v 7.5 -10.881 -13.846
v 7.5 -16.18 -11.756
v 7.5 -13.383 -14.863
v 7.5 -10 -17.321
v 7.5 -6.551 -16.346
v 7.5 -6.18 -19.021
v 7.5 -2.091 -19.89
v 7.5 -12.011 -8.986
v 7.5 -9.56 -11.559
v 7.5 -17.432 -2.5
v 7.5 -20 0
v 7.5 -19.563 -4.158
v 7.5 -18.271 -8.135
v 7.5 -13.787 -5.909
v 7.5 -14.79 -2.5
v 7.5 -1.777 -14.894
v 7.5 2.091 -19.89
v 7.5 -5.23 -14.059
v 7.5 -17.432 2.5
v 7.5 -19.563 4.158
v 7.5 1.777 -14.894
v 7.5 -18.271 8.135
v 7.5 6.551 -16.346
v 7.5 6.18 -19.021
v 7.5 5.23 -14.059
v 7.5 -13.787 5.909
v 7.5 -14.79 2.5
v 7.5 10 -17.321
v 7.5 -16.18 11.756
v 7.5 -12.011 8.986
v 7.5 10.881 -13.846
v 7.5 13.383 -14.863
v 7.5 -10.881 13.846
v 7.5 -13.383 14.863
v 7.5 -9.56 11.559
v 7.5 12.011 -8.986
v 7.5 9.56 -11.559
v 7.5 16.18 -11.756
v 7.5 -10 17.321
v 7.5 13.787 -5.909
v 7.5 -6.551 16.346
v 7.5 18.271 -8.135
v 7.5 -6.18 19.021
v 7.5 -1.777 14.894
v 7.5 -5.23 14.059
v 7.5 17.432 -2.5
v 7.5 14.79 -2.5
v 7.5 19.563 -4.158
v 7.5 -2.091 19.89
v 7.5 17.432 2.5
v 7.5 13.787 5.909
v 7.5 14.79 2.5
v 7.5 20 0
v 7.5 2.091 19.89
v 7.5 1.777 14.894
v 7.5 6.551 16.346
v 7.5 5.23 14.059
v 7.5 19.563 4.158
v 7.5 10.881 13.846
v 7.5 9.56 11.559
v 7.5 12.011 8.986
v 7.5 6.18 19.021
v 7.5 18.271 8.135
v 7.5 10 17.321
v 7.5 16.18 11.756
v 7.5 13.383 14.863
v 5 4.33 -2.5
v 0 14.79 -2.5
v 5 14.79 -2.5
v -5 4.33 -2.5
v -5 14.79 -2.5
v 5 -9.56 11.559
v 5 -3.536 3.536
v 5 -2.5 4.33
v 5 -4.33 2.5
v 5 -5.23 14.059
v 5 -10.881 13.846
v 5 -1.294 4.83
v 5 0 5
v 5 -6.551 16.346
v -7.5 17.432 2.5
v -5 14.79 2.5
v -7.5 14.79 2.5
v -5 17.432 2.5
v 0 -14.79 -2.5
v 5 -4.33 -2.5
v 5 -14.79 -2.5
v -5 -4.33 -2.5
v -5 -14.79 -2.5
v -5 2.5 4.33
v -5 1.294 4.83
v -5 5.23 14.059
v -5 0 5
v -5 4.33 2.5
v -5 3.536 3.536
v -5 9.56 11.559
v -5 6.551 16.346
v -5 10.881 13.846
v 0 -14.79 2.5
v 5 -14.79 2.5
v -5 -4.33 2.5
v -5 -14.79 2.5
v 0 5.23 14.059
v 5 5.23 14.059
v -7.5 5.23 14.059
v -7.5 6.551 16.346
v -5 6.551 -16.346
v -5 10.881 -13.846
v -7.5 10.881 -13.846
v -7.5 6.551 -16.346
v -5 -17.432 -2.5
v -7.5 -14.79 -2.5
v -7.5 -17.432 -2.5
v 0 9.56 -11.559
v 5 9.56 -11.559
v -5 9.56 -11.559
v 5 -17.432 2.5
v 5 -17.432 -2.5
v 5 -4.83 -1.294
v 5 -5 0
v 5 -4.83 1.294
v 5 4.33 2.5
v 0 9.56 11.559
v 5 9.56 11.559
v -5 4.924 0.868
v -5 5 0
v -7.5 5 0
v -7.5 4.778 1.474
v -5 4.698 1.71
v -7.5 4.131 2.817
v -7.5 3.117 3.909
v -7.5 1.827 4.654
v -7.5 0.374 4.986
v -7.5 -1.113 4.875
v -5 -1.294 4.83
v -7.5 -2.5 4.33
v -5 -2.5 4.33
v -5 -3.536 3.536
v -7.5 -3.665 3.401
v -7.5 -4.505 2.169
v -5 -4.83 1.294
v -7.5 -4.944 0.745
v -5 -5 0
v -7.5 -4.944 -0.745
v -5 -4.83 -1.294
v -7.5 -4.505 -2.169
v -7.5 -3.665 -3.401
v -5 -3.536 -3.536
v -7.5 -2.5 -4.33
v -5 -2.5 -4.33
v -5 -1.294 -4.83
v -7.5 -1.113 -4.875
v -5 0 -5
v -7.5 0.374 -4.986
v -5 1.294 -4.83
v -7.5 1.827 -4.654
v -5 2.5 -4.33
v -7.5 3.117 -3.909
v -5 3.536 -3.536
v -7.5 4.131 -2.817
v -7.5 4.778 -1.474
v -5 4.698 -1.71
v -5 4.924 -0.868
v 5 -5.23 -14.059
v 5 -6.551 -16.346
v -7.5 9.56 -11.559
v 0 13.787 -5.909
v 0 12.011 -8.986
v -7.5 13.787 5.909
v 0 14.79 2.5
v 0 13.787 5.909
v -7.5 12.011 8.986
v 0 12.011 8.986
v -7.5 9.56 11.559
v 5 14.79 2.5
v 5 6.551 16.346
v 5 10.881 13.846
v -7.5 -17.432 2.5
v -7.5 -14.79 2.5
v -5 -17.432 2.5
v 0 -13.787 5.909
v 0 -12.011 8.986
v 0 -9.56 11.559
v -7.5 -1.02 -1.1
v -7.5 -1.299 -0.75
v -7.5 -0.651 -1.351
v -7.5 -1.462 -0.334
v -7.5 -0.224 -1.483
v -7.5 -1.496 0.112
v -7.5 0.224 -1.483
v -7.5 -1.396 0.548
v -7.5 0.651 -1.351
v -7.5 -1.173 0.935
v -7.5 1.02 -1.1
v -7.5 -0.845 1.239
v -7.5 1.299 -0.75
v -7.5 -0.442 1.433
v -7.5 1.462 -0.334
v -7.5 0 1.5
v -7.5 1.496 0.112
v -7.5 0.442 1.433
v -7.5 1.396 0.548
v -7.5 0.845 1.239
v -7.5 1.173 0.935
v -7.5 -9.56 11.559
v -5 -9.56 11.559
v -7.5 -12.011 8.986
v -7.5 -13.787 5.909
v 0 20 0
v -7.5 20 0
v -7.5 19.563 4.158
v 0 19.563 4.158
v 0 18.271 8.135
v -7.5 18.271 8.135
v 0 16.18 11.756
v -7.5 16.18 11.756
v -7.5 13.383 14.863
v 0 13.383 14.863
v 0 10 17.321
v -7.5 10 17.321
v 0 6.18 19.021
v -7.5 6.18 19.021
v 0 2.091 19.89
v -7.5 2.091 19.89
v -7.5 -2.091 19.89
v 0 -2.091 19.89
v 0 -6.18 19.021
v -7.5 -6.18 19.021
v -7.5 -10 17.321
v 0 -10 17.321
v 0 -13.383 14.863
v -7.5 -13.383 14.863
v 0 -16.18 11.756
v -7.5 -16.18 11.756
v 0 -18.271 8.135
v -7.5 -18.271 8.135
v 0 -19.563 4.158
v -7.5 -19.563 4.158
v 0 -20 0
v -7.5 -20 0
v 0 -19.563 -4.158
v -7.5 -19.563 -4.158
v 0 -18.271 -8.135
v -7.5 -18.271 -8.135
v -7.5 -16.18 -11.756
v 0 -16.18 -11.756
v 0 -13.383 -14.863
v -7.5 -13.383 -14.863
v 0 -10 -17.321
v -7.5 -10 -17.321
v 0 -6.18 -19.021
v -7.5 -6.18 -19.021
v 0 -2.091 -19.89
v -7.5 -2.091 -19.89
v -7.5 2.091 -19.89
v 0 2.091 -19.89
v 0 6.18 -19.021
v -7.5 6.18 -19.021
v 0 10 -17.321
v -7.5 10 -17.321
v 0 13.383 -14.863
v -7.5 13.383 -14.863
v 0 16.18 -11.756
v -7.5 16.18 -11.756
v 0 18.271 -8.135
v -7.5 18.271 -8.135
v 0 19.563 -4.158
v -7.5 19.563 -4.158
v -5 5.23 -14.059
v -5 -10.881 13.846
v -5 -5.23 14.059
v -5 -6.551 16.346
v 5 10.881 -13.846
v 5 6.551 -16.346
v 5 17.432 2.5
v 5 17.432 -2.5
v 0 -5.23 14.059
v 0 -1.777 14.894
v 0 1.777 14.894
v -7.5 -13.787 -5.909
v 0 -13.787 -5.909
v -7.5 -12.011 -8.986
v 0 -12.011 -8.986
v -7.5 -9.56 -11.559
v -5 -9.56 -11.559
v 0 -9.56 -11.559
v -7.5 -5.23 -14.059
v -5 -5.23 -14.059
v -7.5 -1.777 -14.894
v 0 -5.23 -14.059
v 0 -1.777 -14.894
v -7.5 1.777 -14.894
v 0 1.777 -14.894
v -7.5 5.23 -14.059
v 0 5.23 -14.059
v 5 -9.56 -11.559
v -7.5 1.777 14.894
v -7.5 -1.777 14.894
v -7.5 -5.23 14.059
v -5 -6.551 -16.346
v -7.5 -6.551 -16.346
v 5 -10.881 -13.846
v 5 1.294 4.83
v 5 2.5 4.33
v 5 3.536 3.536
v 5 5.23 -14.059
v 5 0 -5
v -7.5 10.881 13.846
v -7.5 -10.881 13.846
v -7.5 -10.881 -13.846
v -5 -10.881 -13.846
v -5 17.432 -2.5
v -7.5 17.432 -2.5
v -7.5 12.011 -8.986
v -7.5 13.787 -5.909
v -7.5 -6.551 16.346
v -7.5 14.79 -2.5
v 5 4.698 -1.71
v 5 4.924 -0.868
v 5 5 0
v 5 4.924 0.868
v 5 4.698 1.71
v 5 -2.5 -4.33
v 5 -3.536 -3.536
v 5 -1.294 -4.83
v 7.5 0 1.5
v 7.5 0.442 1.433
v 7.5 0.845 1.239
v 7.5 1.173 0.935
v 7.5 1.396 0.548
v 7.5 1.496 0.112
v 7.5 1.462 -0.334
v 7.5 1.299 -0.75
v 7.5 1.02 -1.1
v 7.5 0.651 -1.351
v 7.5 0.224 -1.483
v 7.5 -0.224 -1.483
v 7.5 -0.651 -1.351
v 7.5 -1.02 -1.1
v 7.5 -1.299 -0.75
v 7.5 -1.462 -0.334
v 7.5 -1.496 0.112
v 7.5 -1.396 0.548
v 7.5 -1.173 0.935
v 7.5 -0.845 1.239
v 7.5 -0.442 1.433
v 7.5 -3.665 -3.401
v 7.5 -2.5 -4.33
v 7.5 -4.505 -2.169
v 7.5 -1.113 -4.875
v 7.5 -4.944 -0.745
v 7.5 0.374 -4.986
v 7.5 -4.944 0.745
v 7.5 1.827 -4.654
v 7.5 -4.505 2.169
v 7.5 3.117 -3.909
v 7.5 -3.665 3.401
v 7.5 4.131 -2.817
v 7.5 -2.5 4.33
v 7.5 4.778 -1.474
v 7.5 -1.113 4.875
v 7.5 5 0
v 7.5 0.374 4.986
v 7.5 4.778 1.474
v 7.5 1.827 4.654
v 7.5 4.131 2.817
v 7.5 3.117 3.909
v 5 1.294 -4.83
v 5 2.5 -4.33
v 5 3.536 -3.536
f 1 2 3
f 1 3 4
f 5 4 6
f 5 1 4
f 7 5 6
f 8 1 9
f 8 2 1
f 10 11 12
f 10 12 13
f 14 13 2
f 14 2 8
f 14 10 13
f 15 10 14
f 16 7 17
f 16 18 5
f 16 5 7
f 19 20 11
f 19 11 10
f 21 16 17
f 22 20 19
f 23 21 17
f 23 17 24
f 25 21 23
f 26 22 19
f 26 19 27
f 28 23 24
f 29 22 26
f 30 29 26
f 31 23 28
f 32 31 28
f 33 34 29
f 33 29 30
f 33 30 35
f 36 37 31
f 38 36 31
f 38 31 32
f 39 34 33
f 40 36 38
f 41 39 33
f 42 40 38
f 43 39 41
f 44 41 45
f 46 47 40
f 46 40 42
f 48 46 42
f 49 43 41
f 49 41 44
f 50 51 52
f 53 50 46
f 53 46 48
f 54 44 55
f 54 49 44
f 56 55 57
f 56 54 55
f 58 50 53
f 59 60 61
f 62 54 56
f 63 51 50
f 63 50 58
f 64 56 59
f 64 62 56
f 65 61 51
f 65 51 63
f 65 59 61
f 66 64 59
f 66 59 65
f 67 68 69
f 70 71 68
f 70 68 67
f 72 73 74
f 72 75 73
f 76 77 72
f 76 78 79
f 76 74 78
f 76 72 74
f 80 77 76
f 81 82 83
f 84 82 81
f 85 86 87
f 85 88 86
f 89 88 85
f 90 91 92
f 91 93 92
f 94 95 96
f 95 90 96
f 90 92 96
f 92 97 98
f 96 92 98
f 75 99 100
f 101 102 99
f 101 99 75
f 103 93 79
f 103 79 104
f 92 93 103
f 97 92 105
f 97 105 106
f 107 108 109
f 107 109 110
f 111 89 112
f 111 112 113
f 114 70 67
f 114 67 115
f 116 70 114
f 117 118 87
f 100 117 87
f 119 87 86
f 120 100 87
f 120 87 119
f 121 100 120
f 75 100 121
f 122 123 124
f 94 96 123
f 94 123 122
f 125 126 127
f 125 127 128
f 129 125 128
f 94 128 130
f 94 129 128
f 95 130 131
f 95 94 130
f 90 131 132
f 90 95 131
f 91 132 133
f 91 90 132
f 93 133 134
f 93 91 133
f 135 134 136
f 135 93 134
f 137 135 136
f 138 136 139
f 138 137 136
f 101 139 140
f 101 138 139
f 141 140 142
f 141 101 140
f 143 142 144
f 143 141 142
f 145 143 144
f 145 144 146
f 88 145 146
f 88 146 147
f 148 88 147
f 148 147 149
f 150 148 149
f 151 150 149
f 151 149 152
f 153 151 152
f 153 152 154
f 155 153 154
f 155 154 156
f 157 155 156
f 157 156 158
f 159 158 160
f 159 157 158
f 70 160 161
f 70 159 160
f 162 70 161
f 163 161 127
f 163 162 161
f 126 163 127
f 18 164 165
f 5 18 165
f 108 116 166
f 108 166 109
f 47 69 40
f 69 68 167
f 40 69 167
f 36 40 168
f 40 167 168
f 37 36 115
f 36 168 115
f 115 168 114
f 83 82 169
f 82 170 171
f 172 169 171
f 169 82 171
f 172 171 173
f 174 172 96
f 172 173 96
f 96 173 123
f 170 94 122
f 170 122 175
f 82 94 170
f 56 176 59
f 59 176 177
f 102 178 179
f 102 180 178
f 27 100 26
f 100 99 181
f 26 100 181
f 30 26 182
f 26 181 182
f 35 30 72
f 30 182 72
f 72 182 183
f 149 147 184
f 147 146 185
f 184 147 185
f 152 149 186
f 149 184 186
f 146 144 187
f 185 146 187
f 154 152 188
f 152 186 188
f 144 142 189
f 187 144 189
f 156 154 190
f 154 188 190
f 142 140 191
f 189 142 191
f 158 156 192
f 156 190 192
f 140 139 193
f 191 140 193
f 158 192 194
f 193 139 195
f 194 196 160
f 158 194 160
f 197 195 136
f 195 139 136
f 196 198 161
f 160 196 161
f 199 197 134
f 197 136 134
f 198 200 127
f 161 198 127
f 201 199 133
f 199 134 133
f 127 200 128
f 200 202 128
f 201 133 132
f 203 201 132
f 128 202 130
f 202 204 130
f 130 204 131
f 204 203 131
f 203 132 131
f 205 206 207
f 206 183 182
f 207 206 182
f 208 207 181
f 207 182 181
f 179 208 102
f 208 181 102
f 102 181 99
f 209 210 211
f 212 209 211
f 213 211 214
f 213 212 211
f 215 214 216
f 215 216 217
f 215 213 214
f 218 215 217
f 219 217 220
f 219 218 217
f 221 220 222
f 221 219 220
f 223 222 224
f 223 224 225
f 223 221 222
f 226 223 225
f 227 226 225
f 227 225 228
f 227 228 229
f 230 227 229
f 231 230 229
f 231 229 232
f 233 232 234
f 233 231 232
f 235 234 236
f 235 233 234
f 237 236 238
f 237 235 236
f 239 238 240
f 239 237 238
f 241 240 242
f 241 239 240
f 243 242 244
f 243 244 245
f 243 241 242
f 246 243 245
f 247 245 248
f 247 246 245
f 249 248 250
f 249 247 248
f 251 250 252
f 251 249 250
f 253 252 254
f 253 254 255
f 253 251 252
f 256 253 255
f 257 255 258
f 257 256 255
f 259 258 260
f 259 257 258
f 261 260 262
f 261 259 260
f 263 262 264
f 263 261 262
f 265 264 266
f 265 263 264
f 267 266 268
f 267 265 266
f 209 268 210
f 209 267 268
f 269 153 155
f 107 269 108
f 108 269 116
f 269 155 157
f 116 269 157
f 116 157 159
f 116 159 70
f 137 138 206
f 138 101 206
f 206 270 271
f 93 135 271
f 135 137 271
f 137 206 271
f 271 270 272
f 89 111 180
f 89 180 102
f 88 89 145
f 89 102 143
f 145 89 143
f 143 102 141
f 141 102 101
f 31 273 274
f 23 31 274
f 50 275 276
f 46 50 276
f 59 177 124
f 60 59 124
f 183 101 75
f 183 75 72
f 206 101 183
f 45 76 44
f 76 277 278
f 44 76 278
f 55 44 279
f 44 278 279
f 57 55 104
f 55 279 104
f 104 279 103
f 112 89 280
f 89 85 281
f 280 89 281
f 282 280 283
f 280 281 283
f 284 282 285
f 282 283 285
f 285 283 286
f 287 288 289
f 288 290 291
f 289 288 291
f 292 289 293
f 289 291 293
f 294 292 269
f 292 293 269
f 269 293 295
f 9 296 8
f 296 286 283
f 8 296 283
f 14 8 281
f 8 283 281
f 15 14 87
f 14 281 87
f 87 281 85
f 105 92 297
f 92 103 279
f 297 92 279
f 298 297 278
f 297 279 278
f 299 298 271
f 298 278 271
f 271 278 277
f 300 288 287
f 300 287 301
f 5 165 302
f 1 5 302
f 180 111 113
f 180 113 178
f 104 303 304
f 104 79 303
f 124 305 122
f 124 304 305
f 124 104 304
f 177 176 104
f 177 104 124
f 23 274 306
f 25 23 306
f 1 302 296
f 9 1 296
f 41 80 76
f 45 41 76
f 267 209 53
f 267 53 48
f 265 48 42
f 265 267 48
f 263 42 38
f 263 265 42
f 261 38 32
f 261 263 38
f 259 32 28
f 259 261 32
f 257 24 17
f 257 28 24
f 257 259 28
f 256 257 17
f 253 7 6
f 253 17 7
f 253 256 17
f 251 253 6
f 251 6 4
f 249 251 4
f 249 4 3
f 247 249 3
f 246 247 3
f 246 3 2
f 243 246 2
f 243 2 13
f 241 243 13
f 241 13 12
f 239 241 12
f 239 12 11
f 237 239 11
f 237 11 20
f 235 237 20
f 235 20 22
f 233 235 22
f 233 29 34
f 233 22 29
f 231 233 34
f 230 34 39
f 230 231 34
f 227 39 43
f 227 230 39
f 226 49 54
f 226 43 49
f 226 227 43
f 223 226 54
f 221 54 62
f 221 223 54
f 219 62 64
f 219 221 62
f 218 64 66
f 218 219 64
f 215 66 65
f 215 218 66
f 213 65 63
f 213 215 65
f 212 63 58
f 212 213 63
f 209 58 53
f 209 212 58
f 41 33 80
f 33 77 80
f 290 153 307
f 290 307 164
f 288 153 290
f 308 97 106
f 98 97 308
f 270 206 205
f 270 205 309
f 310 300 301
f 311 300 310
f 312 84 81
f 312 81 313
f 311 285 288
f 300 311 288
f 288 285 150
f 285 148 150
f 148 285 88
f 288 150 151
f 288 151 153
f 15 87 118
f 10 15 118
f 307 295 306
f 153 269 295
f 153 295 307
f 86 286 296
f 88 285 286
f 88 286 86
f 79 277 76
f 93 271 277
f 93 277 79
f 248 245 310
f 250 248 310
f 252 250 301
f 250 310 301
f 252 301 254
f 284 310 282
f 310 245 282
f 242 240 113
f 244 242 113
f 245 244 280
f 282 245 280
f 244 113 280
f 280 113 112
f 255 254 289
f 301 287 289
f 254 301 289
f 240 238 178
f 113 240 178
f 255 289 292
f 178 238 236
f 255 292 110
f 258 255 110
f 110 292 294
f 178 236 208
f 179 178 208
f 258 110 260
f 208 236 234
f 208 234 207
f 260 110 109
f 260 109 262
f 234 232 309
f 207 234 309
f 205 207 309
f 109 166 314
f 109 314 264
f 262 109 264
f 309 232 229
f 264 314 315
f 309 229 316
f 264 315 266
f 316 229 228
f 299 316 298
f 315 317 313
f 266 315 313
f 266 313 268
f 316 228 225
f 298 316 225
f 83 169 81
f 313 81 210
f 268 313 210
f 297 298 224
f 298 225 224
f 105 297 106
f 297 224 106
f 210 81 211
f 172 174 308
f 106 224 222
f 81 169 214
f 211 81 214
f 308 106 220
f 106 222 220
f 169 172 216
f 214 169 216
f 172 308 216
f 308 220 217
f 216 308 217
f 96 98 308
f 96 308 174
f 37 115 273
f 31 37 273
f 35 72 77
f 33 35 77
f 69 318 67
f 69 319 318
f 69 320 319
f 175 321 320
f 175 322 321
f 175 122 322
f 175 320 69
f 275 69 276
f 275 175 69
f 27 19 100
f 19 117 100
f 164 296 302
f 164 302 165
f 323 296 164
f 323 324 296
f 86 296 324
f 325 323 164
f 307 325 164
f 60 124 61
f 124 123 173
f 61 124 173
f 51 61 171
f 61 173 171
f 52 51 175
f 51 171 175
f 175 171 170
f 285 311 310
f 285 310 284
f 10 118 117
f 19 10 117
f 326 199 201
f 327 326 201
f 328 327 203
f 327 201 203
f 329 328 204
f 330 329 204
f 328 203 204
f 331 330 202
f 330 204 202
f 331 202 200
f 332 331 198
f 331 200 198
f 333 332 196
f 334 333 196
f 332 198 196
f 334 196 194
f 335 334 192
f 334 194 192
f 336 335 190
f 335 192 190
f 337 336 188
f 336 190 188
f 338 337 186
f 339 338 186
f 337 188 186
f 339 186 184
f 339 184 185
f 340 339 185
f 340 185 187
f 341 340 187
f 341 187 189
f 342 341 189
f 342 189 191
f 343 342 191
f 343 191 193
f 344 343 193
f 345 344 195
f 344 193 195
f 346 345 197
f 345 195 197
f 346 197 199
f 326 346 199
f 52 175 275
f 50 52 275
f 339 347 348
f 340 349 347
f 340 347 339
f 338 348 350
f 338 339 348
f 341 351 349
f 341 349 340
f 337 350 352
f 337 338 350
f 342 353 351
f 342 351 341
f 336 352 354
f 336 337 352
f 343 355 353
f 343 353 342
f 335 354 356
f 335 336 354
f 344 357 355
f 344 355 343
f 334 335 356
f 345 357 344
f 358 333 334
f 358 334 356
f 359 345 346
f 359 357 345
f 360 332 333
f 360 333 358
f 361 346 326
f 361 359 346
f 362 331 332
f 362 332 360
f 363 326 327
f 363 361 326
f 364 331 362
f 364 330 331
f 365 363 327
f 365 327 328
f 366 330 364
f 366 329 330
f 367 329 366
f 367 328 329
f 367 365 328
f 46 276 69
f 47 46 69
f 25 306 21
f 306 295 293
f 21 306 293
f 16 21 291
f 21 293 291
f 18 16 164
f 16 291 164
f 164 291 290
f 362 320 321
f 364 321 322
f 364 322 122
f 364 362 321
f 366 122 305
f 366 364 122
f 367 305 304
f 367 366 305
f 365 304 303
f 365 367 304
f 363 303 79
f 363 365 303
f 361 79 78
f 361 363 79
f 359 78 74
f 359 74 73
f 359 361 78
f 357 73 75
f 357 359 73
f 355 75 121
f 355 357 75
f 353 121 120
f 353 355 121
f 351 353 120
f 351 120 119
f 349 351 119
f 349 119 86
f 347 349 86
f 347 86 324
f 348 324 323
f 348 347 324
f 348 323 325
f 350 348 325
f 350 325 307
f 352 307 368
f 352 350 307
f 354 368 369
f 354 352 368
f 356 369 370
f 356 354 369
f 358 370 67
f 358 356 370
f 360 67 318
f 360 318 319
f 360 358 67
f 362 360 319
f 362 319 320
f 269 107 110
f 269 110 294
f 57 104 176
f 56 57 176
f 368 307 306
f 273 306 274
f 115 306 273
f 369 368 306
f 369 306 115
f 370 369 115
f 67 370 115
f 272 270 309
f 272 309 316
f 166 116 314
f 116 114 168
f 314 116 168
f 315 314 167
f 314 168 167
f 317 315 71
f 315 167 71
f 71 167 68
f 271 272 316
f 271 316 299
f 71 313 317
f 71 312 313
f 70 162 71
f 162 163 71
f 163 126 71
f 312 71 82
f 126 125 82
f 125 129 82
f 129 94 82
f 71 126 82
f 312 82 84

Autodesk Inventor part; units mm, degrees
ref_plane "YZ Plane" through (0, 0, 0) normal (1, 0, 0) x (0, 1, 0)
ref_plane "XZ Plane" through (0, 0, 0) normal (0, 1, 0) x (-1, 0, 0)
ref_plane "XY Plane" through (0, 0, 0) normal (0, 0, 1) x (1, 0, 0)
sketch "Sketch1" plane through (0, 0, 0) normal (1, 0, 0) x (0, 1, 0)
  circle A0 centre (0, 0) radius 20
  circle A1 centre (0, 0) radius 15
  circle A2 centre (0, 0) radius 5
  line L0 (20, 0) -> (9.9317, 0) construction
  line L1 (9.9317, 0) -> (0, 0) construction
  line L2 (17.4317, -2.5) -> (2.4317, -2.5)
  line L3 (2.4317, -2.5) -> (2.4317, 2.5)
  line L4 (2.4317, 2.5) -> (17.4317, 2.5)
  line L5 (17.4317, 2.5) -> (17.4317, -2.5)
  line L6 (17.4317, -2.5) -> (2.4317, 2.5) construction
  line L7 (2.4317, -2.5) -> (17.4317, 2.5) construction
  line L8 (-0.9492, 3.3559) -> (6.5508, 16.3463)
  line L9 (10.8809, 13.8463) -> (3.3809, 0.8559)
  line L10 (6.5508, 16.3463) -> (10.8809, 13.8463)
  line L11 (3.3809, 0.8559) -> (-0.9492, 3.3559)
  line L12 (-3.3809, 0.8559) -> (-10.8809, 13.8463)
  line L13 (-6.5508, 16.3463) -> (0.9492, 3.3559)
  line L14 (-10.8809, 13.8463) -> (-6.5508, 16.3463)
  line L15 (0.9492, 3.3559) -> (-3.3809, 0.8559)
  line L16 (-2.4317, -2.5) -> (-17.4317, -2.5)
  line L17 (-17.4317, 2.5) -> (-2.4317, 2.5)
  line L18 (-17.4317, -2.5) -> (-17.4317, 2.5)
  line L19 (-2.4317, 2.5) -> (-2.4317, -2.5)
  line L20 (0.9492, -3.3559) -> (-6.5508, -16.3463)
  line L21 (-10.8809, -13.8463) -> (-3.3809, -0.8559)
  line L22 (-6.5508, -16.3463) -> (-10.8809, -13.8463)
  line L23 (-3.3809, -0.8559) -> (0.9492, -3.3559)
  line L24 (3.3809, -0.8559) -> (10.8809, -13.8463)
  line L25 (6.5508, -16.3463) -> (-0.9492, -3.3559)
  line L26 (10.8809, -13.8463) -> (6.5508, -16.3463)
  line L27 (-0.9492, -3.3559) -> (3.3809, -0.8559)
  dimension "d0" = 40
  dimension "d1" = 30
  dimension "d2" = 10
  dimension "d4" = 15
  dimension "d5" = 5
  dimension "d8" = 360
extrude "Extrusion1" add sketch "Sketch1" along normal mid plane 15 contours A0 | L4 L3 L11 L15 L13 A2 | L9 L11 L3 L4 | A2 L24 L27 L3 L11 L9 | A2 L20 L23 L27 L3 L2 | L2 L3 L27 L24 | L8 L11 L15 L19 L17 A2 | L13 L15 L11 L8 | L25 L27 L23 L20 | A2 L16 L19 L23 L27 L25 | L12 L15 L19 L23 L21 A2 | L17 L19 L15 L12 | L3 L27 L23 L19 L15 L11 | L21 L23 L19 L16
extrude "Extrusion2" add sketch "Sketch1" along normal mid plane 10 contours A1 L2 A2 L4 | A1 L4 L5 L2 | L9 A2 L8 A1 | A1 L8 L10 L9 | L4 L3 L11 L15 L13 A2 | L9 L11 L3 L4 | A2 L24 L27 L3 L11 L9 | L24 L26 L25 A1 | A1 L25 A2 L24 | A2 L20 L23 L27 L3 L2 | L2 L3 L27 L24 | L8 L11 L15 L19 L17 A2 | L13 L15 L11 L8 | A2 L12 A1 L13 | L20 A1 L21 A2 | L25 L27 L23 L20 | A2 L16 L19 L23 L27 L25 | A1 L12 L14 L13 | L12 L15 L19 L23 L21 A2 | L17 L19 L15 L12 | A2 L16 A1 L17 | L20 L22 L21 A1 | L21 L23 L19 L16 | A1 L16 L18 L17
sketch "Sketch2" plane through (-7.5, 0, 0) normal (-1, 0, 0) x (0, 0, 1)
  circle A0 centre (0, 0) radius 1.5
  dimension "d14" = 3
extrude "Extrusion3" cut sketch "Sketch2" against normal up to next
properties material "Rubber"
